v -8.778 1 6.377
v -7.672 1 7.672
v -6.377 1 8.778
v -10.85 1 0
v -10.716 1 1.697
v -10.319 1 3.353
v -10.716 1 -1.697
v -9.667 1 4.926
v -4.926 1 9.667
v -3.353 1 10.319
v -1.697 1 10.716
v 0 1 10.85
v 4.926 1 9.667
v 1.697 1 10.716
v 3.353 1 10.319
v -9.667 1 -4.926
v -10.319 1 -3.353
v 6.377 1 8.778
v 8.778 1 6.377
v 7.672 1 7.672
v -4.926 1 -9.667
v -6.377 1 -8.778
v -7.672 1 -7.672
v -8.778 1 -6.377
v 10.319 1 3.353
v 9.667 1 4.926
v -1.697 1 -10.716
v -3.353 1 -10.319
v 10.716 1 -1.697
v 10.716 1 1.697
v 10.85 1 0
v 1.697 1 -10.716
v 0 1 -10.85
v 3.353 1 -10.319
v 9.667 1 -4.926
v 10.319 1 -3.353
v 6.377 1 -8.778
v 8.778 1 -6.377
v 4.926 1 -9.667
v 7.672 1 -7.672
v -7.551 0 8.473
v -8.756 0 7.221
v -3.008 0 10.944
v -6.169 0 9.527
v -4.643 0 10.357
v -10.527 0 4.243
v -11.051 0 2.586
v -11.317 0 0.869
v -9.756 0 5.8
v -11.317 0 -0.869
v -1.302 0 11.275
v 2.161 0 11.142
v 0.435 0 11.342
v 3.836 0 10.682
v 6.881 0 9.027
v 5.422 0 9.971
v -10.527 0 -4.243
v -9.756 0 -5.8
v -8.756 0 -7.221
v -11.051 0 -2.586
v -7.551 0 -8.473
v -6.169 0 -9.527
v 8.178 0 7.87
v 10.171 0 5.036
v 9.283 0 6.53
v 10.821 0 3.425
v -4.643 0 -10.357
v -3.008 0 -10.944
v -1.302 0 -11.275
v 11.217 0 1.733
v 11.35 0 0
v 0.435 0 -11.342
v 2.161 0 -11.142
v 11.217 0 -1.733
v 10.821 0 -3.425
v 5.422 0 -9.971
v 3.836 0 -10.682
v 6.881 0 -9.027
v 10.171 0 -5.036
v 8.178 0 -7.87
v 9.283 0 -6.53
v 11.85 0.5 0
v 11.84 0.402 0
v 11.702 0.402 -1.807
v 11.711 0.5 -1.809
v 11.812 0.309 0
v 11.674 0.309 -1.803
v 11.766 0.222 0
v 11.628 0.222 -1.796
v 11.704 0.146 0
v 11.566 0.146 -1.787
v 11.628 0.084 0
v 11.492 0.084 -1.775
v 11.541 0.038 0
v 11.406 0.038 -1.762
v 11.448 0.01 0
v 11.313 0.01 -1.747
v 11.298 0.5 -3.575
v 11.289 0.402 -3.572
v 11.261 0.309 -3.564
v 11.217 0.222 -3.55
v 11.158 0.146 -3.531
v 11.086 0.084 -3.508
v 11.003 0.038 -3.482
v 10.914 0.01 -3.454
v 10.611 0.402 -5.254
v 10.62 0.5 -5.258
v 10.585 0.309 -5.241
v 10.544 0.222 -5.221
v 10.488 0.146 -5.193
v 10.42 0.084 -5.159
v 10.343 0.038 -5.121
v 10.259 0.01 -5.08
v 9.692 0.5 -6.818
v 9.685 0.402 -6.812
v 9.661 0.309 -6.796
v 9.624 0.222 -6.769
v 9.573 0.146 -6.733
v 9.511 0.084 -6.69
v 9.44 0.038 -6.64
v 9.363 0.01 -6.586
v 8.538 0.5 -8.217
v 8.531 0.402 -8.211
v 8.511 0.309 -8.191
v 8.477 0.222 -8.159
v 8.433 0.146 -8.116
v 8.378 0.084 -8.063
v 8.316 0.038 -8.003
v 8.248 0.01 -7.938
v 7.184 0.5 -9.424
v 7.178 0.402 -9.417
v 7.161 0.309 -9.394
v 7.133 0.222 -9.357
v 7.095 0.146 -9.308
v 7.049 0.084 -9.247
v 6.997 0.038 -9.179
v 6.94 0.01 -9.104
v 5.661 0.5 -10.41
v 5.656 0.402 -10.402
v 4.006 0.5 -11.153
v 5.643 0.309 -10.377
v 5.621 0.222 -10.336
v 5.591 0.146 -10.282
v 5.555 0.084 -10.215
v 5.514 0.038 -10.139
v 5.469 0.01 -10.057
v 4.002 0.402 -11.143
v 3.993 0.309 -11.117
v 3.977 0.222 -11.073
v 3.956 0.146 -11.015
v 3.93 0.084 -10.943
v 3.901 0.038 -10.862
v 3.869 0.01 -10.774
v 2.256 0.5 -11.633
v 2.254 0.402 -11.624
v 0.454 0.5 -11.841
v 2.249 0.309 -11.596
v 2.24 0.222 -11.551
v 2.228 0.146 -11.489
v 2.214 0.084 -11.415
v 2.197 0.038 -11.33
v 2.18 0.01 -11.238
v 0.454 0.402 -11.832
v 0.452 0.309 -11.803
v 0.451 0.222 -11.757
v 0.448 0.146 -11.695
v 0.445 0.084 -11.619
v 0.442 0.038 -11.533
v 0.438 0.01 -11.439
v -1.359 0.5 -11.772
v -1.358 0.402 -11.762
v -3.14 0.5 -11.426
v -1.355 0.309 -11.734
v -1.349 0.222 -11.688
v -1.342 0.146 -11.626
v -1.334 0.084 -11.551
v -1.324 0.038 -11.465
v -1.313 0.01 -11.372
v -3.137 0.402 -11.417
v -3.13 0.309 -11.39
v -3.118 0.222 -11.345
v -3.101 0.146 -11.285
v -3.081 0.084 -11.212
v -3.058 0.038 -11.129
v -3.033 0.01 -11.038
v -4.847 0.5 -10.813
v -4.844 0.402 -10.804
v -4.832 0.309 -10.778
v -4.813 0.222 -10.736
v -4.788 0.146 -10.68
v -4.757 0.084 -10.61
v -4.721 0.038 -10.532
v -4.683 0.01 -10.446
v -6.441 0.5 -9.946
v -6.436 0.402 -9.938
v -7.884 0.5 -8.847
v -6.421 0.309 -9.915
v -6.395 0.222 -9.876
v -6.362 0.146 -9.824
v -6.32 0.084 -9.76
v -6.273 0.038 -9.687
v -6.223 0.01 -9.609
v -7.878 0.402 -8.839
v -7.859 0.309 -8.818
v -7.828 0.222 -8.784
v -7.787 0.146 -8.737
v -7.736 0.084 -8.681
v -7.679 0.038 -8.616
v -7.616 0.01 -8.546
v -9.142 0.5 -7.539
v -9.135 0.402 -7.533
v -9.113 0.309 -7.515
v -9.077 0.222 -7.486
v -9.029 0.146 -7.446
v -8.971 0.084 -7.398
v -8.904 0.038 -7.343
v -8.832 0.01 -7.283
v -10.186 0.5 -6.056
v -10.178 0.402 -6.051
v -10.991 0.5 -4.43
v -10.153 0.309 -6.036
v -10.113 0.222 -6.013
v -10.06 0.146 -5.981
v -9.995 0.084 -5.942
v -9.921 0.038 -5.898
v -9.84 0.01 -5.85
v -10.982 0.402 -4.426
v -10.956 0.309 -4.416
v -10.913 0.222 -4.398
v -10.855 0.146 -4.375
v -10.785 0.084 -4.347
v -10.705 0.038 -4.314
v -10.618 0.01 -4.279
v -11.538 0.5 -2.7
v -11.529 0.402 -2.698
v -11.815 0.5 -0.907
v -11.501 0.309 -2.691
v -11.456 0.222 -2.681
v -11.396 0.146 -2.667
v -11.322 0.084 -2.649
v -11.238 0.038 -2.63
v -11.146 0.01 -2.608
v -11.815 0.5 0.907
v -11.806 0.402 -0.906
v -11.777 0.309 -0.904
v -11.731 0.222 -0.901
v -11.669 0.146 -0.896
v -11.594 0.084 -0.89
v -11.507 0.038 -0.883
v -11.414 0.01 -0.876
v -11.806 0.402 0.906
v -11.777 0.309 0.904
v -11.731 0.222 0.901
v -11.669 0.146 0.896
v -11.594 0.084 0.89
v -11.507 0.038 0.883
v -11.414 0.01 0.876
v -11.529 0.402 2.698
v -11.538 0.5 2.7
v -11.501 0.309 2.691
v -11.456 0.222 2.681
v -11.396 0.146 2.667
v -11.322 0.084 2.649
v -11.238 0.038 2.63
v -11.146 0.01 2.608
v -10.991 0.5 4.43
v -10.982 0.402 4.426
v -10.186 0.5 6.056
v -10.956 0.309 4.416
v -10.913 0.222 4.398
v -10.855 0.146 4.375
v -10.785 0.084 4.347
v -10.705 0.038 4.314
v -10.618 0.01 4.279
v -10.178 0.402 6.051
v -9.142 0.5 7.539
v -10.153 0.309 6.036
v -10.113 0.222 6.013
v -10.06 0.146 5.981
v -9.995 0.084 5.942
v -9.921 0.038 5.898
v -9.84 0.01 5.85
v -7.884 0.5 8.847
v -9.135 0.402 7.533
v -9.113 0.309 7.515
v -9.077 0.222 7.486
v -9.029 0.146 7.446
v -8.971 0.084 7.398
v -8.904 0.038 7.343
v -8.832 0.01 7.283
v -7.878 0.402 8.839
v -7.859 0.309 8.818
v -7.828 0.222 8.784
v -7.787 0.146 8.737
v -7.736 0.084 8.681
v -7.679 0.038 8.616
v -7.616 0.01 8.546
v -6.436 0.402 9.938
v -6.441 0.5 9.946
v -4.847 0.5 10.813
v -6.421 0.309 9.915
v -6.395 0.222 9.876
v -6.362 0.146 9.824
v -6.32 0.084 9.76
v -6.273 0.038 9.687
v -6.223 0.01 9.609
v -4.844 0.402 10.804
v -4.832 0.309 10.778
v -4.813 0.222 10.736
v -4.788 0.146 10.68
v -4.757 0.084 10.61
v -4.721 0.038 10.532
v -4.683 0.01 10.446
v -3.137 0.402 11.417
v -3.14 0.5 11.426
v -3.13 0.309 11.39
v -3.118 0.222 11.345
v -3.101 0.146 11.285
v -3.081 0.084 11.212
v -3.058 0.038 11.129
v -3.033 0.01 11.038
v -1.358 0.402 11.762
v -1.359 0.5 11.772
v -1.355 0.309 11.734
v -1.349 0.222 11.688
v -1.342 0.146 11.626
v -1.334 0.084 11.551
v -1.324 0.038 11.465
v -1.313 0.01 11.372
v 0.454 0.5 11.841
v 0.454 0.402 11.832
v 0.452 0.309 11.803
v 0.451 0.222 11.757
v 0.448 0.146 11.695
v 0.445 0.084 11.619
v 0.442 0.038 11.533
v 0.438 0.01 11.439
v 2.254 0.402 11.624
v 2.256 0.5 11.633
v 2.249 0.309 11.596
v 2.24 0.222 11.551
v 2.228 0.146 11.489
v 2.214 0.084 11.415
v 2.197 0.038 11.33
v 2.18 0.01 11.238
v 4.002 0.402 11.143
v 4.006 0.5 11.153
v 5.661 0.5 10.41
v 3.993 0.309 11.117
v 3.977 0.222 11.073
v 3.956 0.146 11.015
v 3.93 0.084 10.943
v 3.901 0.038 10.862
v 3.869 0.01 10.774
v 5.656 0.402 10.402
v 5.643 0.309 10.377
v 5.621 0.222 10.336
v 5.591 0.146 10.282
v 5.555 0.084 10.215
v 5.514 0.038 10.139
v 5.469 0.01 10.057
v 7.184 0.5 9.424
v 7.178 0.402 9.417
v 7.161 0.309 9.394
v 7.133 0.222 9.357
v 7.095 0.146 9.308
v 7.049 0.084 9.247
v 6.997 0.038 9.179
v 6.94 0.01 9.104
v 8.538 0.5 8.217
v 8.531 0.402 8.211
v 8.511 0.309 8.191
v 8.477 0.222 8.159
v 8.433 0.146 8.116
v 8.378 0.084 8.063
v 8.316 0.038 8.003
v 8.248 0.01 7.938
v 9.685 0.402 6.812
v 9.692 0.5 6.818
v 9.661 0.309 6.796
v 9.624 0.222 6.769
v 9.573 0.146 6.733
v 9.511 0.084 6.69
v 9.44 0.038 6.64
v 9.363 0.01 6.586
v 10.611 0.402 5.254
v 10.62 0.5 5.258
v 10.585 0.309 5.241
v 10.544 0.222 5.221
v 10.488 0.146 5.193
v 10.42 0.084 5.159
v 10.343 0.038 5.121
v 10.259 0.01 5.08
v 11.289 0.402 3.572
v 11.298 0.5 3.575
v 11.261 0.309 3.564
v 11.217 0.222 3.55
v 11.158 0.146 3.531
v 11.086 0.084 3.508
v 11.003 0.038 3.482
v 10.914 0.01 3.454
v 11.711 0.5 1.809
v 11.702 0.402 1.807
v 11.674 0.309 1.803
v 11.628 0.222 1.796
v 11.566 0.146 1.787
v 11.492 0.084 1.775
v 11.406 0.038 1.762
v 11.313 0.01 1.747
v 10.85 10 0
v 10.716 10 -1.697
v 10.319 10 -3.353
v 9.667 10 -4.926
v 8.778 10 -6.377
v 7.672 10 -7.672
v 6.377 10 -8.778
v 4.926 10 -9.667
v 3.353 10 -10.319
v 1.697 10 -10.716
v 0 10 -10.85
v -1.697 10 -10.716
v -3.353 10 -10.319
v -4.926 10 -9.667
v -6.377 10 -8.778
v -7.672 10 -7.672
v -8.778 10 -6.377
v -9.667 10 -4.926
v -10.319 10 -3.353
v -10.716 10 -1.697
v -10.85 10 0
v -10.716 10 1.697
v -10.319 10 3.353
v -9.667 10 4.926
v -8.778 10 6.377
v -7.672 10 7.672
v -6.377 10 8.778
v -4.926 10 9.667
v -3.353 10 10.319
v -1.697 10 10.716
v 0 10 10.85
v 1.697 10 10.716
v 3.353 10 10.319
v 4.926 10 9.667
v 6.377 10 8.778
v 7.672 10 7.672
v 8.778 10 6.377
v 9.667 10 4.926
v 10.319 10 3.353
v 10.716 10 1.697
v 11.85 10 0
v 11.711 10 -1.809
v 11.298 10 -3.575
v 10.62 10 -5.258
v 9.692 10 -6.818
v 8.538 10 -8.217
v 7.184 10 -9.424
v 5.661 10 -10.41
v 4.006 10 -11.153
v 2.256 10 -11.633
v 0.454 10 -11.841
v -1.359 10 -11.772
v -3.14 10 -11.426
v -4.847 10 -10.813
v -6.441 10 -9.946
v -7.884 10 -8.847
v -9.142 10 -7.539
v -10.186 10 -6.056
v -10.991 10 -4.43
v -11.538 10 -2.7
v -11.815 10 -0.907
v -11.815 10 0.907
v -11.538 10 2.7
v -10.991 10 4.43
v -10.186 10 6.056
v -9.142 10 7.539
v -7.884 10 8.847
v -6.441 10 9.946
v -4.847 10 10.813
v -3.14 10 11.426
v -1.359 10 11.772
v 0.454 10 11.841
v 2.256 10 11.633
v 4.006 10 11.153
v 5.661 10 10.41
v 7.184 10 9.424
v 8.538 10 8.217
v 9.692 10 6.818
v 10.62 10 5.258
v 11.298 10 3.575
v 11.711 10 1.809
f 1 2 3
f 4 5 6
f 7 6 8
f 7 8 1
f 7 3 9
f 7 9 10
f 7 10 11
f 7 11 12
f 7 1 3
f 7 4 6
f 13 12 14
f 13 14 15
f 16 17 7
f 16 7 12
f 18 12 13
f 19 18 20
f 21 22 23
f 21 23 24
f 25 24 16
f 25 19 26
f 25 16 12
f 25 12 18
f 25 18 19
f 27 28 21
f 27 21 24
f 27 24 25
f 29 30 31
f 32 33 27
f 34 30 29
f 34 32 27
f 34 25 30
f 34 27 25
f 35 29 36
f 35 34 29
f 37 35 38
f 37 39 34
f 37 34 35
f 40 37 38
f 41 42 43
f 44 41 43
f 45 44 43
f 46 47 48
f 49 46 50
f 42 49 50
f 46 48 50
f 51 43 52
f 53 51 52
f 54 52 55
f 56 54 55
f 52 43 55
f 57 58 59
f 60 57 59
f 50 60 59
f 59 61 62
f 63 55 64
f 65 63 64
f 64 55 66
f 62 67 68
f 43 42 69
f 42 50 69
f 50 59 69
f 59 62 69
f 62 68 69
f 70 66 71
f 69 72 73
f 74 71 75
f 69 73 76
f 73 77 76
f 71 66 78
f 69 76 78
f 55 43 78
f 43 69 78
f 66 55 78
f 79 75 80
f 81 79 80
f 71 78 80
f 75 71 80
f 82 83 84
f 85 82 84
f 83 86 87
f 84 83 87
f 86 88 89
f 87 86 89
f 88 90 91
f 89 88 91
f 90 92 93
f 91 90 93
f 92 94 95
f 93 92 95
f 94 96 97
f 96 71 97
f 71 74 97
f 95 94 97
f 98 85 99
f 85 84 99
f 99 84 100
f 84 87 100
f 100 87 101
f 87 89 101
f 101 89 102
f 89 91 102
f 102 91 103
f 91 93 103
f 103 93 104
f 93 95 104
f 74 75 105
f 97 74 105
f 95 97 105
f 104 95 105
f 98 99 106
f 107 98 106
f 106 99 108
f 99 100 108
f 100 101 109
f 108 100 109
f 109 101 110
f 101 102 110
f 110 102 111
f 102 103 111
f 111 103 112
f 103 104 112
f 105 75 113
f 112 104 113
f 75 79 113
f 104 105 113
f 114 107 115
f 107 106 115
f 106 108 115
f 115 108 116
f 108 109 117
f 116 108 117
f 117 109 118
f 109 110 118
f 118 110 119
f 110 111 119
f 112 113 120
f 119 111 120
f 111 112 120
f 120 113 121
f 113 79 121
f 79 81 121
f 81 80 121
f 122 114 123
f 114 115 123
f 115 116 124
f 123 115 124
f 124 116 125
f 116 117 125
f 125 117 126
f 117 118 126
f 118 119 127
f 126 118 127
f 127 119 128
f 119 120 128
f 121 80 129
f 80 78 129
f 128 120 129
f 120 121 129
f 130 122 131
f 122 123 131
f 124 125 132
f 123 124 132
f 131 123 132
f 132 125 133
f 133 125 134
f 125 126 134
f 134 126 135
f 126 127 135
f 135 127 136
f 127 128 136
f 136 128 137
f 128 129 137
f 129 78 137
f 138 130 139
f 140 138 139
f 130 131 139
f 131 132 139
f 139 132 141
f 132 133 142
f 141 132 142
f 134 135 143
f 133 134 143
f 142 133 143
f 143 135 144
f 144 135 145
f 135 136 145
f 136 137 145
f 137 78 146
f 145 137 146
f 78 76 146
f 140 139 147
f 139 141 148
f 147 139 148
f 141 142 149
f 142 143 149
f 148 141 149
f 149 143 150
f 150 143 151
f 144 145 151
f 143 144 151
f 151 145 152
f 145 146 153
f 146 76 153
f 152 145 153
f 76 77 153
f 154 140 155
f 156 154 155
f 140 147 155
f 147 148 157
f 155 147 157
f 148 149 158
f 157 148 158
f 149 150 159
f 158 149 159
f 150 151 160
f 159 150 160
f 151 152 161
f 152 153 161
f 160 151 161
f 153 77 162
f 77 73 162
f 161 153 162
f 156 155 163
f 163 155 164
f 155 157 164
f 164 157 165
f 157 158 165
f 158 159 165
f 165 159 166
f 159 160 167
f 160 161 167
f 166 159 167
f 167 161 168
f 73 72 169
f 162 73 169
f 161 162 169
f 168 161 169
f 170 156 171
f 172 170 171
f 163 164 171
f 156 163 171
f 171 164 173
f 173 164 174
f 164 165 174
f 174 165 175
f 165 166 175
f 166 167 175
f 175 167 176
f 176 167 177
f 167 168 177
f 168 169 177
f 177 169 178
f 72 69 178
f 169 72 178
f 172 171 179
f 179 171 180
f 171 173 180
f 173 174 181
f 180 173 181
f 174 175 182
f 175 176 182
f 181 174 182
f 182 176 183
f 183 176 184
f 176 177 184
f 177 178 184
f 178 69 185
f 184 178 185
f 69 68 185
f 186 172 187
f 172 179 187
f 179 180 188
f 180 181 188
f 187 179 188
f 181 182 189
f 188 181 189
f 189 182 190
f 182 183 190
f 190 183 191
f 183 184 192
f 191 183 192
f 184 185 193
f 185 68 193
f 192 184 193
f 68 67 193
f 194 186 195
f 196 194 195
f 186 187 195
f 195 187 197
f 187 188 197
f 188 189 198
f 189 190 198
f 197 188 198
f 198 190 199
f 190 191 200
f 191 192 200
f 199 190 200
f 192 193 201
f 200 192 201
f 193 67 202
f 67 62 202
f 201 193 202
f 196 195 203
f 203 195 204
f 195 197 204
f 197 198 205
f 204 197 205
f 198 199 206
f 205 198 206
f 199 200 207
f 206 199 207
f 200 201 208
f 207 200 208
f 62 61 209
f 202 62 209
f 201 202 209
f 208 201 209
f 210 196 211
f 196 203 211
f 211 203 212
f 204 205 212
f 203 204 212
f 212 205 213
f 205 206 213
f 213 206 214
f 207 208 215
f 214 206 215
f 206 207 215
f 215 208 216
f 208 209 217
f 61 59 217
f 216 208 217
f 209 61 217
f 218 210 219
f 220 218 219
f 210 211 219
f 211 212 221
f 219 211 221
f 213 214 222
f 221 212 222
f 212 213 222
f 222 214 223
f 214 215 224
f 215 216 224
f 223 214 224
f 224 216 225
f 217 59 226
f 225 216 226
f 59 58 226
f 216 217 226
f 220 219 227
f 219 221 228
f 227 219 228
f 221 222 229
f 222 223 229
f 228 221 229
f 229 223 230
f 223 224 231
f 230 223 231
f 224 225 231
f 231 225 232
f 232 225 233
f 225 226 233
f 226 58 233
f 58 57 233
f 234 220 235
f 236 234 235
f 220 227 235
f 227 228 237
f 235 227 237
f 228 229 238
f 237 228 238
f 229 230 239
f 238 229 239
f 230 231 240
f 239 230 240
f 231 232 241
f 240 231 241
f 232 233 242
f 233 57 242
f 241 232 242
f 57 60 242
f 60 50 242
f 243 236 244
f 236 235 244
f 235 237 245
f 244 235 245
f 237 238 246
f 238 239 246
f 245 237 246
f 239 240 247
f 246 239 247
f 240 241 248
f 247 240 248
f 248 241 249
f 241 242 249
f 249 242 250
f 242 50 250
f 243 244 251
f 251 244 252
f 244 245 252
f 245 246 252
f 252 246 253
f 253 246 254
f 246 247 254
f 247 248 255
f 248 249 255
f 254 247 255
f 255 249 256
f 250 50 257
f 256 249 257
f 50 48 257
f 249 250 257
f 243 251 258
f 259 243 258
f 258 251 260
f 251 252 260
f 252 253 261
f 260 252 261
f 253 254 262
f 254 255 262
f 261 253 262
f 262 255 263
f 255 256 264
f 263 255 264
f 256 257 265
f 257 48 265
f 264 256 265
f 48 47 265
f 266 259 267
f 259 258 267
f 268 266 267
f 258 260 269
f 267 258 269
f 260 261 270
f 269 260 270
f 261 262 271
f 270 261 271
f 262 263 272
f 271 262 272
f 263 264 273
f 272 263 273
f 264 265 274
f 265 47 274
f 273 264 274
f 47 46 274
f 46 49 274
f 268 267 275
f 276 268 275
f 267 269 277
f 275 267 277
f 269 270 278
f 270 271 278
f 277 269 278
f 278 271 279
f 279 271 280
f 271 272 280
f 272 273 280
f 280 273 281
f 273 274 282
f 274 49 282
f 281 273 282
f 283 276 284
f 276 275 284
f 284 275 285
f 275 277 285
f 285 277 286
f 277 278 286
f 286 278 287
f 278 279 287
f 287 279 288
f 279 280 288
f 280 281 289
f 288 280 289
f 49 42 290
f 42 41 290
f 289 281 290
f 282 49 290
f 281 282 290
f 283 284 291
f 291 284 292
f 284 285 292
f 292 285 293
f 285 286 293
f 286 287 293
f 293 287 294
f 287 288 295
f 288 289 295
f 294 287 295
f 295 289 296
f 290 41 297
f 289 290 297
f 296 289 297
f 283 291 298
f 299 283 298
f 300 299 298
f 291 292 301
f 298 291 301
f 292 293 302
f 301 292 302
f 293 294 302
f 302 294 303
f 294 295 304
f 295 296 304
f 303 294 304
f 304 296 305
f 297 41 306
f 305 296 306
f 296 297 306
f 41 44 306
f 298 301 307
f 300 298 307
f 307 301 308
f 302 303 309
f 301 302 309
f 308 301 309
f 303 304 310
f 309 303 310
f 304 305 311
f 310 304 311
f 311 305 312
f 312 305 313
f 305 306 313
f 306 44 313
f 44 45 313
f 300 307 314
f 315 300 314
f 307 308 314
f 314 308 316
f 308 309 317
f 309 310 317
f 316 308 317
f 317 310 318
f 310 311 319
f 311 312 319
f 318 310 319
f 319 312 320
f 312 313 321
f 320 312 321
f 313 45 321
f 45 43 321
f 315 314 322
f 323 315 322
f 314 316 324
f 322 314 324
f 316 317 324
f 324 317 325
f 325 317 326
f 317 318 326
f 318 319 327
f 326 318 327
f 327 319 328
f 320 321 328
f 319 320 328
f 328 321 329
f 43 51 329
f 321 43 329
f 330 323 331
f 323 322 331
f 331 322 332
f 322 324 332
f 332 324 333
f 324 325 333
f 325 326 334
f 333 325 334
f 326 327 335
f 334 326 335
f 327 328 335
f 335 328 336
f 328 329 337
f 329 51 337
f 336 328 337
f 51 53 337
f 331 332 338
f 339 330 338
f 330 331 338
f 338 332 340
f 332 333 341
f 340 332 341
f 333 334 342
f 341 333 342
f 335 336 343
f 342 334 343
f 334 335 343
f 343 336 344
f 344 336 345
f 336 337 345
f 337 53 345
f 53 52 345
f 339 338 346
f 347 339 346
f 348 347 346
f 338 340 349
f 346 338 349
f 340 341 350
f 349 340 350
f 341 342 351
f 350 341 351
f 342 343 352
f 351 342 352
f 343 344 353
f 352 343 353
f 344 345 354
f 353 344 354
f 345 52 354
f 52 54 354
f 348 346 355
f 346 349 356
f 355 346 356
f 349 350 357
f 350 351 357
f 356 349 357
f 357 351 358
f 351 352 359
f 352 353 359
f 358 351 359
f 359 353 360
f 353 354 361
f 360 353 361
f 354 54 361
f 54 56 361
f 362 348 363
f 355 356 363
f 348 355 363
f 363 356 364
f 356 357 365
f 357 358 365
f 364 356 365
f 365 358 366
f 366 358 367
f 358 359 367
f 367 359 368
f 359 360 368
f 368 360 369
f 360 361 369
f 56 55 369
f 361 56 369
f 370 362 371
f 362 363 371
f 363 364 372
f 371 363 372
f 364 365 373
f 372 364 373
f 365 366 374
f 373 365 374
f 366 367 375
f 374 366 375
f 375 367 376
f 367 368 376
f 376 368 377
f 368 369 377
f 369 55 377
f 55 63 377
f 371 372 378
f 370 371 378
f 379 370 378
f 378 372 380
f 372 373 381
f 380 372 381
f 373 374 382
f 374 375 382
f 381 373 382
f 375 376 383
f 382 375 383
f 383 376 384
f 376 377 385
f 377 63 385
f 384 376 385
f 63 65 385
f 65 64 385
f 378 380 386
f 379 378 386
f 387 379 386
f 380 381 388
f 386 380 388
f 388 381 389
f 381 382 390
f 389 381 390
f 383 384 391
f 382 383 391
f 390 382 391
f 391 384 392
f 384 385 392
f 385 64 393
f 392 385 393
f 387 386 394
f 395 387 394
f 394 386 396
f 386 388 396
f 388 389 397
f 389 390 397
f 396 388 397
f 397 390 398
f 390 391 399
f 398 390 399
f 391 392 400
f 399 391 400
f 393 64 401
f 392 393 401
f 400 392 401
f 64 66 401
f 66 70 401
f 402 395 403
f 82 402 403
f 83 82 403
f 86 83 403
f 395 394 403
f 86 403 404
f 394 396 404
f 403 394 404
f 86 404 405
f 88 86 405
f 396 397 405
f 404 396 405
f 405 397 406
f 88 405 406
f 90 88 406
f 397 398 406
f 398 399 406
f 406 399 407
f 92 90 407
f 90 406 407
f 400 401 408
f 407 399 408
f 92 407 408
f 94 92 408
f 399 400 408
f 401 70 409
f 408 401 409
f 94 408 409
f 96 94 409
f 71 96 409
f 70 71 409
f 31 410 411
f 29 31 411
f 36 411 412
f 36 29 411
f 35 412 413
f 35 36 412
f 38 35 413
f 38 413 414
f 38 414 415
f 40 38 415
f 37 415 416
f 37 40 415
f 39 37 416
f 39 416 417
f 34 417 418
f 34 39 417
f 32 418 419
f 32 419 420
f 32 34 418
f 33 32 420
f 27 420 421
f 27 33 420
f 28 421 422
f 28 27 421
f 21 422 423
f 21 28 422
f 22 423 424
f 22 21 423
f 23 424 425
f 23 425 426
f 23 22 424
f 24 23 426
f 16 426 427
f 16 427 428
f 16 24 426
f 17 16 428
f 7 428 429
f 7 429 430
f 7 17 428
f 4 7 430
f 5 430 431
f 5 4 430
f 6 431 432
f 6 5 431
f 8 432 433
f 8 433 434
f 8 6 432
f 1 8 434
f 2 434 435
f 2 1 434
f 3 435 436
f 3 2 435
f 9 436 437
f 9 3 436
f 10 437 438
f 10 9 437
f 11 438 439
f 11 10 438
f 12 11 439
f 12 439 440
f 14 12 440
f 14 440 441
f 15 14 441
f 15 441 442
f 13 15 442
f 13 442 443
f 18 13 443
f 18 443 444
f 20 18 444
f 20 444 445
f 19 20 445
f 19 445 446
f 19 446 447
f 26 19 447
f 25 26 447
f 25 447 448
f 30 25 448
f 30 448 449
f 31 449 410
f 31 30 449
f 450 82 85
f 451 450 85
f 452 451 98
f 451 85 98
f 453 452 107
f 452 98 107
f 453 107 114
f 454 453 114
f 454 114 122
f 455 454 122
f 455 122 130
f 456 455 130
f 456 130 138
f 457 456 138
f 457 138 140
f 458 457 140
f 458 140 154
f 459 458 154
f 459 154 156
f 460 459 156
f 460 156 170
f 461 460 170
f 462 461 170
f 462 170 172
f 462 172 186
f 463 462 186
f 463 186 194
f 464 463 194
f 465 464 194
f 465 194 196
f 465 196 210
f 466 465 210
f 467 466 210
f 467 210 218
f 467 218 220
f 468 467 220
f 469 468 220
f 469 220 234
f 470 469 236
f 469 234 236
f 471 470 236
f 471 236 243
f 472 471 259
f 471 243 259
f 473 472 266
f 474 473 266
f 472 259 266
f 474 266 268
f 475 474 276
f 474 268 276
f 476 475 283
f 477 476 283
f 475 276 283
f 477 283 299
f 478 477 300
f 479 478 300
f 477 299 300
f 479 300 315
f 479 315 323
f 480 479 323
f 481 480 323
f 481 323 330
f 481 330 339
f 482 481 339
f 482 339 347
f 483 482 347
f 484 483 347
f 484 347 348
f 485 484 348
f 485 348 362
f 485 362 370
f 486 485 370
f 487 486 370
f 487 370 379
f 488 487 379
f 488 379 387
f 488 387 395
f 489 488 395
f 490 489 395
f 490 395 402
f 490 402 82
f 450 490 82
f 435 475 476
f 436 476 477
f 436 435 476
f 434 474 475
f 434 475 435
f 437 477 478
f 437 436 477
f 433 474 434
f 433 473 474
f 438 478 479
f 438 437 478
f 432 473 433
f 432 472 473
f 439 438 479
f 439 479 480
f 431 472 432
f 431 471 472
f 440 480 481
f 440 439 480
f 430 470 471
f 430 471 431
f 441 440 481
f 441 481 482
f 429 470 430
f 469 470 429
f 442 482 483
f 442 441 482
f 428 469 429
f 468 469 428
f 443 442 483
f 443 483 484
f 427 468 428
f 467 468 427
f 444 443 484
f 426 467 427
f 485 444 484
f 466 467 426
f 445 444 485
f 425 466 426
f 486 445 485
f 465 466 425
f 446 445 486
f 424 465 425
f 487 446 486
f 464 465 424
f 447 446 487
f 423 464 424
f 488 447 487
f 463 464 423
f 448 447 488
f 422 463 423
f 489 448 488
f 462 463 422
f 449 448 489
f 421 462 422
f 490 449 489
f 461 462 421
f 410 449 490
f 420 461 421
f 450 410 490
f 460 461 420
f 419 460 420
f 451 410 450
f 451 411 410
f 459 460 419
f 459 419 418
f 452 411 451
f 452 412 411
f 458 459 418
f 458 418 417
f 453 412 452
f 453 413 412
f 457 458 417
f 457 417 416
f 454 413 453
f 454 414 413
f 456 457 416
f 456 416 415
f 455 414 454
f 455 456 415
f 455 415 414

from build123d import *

# Parameters (mm, degrees)
SKETCH1_R           = 11.85
BOSS_EXTRUDE1_DEPTH = 1
SKETCH2_R           = 11.85
SKETCH2_R_2         = 10.85
BOSS_EXTRUDE2_DEPTH = 9
FILLET1_R           = 0.5


with BuildPart() as part:
    # Sketch1 → Boss-Extrude1 (new body)
    with BuildSketch(Plane(origin=(0, 0, 0), x_dir=(1, 0, 0), z_dir=(0, 1, 0))):
        Circle(SKETCH1_R)
    extrude(amount=BOSS_EXTRUDE1_DEPTH)

    # Sketch2 → Boss-Extrude2 (add)
    with BuildSketch(Plane(origin=(0, 1, 0), x_dir=(1, 0, 0), z_dir=(0, 1, 0))):
        Circle(SKETCH2_R)
        Circle(SKETCH2_R_2, mode=Mode.SUBTRACT)
    extrude(amount=BOSS_EXTRUDE2_DEPTH)

    # Fillet1
    fillet1_edges = [part.edges().sort_by_distance(p)[0] for p in [
        (-11.85, 0, 0),
    ]]
    fillet(fillet1_edges, radius=FILLET1_R)


solid = part.part
